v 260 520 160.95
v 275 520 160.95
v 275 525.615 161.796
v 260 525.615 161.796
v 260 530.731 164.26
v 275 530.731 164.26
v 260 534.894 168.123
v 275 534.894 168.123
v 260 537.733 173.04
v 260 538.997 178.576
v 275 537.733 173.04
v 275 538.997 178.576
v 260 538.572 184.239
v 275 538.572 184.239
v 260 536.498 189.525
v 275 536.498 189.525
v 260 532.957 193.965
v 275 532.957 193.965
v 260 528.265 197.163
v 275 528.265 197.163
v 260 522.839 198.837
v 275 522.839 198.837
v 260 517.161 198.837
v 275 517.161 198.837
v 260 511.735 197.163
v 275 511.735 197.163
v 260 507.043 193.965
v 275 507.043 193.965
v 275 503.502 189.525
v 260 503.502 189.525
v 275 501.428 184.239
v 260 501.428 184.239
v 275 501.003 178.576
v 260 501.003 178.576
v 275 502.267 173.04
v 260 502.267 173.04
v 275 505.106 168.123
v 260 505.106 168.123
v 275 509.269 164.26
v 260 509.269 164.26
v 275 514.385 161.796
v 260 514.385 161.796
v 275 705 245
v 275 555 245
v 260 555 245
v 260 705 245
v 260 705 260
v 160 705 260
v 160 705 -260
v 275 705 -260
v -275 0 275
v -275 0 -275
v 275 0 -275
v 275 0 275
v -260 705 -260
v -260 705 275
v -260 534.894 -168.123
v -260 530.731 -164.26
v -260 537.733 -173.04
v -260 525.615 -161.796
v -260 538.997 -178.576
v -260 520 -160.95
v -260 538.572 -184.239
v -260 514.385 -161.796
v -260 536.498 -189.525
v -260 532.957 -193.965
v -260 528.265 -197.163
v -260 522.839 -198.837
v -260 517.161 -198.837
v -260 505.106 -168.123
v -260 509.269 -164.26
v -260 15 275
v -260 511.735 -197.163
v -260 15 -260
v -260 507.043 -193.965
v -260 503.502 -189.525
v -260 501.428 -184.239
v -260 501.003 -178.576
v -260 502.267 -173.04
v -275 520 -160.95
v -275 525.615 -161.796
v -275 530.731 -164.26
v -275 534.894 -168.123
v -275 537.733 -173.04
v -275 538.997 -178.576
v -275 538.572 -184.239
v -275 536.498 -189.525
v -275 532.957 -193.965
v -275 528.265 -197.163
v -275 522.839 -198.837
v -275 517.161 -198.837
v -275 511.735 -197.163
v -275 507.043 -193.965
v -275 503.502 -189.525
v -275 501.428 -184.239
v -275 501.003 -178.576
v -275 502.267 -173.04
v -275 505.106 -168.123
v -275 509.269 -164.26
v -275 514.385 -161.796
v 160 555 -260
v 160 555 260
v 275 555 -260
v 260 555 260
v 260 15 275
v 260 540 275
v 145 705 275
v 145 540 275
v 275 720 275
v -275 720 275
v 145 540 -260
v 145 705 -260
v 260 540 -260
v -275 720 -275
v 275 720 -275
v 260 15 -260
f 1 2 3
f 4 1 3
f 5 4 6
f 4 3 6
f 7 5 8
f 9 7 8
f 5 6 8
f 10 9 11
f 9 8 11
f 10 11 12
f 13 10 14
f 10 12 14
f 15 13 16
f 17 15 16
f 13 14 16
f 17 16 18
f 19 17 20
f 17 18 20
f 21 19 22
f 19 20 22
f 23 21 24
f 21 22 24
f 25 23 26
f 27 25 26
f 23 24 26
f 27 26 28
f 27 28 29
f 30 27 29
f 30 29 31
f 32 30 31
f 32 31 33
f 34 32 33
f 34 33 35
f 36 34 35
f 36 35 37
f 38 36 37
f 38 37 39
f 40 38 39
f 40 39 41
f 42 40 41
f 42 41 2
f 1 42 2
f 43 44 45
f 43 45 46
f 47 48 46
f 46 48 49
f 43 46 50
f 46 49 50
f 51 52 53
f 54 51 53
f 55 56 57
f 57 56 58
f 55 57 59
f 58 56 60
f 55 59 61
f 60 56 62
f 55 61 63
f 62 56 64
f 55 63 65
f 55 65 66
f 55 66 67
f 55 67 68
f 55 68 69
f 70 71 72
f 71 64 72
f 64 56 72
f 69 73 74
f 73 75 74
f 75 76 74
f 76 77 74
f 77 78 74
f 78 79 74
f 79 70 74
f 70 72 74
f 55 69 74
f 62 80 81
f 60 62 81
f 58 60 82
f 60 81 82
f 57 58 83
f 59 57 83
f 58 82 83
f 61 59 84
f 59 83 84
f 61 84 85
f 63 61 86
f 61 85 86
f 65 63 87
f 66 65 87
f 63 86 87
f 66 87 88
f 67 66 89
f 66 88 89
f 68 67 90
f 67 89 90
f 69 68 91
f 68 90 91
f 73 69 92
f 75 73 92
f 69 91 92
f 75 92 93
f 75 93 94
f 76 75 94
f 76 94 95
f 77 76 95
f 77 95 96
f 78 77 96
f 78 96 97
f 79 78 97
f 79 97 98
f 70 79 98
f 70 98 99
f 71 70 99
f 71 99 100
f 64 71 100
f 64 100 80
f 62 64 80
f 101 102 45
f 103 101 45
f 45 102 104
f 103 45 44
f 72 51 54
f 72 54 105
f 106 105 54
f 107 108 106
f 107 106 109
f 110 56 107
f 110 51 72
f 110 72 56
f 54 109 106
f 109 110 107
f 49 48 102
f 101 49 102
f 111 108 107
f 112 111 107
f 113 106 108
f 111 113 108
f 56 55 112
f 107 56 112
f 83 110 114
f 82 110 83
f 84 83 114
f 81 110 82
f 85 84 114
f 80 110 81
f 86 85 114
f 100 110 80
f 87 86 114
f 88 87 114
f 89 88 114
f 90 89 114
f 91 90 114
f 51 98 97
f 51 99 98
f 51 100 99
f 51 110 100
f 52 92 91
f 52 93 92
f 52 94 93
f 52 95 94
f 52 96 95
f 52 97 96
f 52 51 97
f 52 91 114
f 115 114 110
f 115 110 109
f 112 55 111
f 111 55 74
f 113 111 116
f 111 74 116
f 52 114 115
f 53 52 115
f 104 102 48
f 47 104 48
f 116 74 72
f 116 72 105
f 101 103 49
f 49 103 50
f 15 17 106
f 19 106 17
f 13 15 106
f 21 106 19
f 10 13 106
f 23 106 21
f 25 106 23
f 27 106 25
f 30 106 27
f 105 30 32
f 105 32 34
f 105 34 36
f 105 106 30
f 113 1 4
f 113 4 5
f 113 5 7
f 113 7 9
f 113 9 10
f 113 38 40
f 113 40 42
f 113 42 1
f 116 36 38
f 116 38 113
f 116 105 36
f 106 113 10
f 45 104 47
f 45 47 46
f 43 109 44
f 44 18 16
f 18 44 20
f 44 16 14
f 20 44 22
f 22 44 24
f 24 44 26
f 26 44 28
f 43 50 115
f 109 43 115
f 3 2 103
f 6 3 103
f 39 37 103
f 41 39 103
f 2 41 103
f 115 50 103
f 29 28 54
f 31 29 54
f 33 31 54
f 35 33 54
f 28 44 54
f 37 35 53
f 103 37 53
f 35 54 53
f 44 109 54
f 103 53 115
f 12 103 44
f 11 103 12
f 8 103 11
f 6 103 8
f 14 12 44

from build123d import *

# Parameters (mm, degrees)
CROQUIS1_W              = 550
CROQUIS1_H              = 550
SALIENTE_EXTRUIR1_DEPTH = 720
VACIADO1_T              = -15
SALIENTE_EXTRUIR2_DEPTH = 535
CROQUIS3_W              = 505
CROQUIS3_H              = 150
CORTAR_EXTRUIR1_DEPTH   = 115
CROQUIS4_W              = 15
CROQUIS4_H              = 150
SALIENTE_EXTRUIR3_DEPTH = 100
CROQUIS5_R              = 19.05
CORTAR_EXTRUIR2_DEPTH   = 30
CROQUIS6_R              = 19.05
CORTAR_EXTRUIR3_DEPTH   = 30


with BuildPart() as part:
    # Croquis1 → Saliente-Extruir1 (new body)
    with BuildSketch(Plane(origin=(0, 0, 0), x_dir=(1, 0, 0), z_dir=(0, 1, 0))):
        Rectangle(CROQUIS1_W, CROQUIS1_H)
    extrude(amount=SALIENTE_EXTRUIR1_DEPTH)

    # Vaciado1
    vaciado1_openings = [part.faces().sort_by_distance(p)[0] for p in [
        (0, 360, 275),
    ]]
    offset(amount=VACIADO1_T, openings=vaciado1_openings, kind=Kind.INTERSECTION)

    # Croquis2 → Saliente-Extruir2 (add)
    with BuildSketch(Plane.XY.offset(275)):
        Polygon((160, 705), (160, 555), (260, 555), (260, 540), (145, 540), (145, 705), align=None)
    extrude(amount=-SALIENTE_EXTRUIR2_DEPTH)

    # Croquis3 → Cortar-Extruir1 (cut)
    with BuildSketch(Plane(origin=(275, 0, 0), x_dir=(0, 0, -1), z_dir=(1, 0, 0))):
        with Locations((7.5, 630)):
            Rectangle(CROQUIS3_W, CROQUIS3_H)
    extrude(amount=-CORTAR_EXTRUIR1_DEPTH, mode=Mode.SUBTRACT)

    # Croquis4 → Saliente-Extruir3 (add)
    with BuildSketch(Plane(origin=(160, 0, 0), x_dir=(0, 0, -1), z_dir=(1, 0, 0))):
        with Locations((-267.5, 630)):
            Rectangle(CROQUIS4_W, CROQUIS4_H)
    extrude(amount=SALIENTE_EXTRUIR3_DEPTH)

    # Croquis5 → Cortar-Extruir2 (cut)
    with BuildSketch(Plane.ZY.offset(275)):
        with Locations((-180, 520)):
            Circle(CROQUIS5_R)
    extrude(amount=-CORTAR_EXTRUIR2_DEPTH, mode=Mode.SUBTRACT)

    # Croquis6 → Cortar-Extruir3 (cut)
    with BuildSketch(Plane(origin=(275, 0, 0), x_dir=(0, 0, -1), z_dir=(1, 0, 0))):
        with Locations((-180, 520)):
            Circle(CROQUIS6_R)
    extrude(amount=-CORTAR_EXTRUIR3_DEPTH, mode=Mode.SUBTRACT)


solid = part.part
